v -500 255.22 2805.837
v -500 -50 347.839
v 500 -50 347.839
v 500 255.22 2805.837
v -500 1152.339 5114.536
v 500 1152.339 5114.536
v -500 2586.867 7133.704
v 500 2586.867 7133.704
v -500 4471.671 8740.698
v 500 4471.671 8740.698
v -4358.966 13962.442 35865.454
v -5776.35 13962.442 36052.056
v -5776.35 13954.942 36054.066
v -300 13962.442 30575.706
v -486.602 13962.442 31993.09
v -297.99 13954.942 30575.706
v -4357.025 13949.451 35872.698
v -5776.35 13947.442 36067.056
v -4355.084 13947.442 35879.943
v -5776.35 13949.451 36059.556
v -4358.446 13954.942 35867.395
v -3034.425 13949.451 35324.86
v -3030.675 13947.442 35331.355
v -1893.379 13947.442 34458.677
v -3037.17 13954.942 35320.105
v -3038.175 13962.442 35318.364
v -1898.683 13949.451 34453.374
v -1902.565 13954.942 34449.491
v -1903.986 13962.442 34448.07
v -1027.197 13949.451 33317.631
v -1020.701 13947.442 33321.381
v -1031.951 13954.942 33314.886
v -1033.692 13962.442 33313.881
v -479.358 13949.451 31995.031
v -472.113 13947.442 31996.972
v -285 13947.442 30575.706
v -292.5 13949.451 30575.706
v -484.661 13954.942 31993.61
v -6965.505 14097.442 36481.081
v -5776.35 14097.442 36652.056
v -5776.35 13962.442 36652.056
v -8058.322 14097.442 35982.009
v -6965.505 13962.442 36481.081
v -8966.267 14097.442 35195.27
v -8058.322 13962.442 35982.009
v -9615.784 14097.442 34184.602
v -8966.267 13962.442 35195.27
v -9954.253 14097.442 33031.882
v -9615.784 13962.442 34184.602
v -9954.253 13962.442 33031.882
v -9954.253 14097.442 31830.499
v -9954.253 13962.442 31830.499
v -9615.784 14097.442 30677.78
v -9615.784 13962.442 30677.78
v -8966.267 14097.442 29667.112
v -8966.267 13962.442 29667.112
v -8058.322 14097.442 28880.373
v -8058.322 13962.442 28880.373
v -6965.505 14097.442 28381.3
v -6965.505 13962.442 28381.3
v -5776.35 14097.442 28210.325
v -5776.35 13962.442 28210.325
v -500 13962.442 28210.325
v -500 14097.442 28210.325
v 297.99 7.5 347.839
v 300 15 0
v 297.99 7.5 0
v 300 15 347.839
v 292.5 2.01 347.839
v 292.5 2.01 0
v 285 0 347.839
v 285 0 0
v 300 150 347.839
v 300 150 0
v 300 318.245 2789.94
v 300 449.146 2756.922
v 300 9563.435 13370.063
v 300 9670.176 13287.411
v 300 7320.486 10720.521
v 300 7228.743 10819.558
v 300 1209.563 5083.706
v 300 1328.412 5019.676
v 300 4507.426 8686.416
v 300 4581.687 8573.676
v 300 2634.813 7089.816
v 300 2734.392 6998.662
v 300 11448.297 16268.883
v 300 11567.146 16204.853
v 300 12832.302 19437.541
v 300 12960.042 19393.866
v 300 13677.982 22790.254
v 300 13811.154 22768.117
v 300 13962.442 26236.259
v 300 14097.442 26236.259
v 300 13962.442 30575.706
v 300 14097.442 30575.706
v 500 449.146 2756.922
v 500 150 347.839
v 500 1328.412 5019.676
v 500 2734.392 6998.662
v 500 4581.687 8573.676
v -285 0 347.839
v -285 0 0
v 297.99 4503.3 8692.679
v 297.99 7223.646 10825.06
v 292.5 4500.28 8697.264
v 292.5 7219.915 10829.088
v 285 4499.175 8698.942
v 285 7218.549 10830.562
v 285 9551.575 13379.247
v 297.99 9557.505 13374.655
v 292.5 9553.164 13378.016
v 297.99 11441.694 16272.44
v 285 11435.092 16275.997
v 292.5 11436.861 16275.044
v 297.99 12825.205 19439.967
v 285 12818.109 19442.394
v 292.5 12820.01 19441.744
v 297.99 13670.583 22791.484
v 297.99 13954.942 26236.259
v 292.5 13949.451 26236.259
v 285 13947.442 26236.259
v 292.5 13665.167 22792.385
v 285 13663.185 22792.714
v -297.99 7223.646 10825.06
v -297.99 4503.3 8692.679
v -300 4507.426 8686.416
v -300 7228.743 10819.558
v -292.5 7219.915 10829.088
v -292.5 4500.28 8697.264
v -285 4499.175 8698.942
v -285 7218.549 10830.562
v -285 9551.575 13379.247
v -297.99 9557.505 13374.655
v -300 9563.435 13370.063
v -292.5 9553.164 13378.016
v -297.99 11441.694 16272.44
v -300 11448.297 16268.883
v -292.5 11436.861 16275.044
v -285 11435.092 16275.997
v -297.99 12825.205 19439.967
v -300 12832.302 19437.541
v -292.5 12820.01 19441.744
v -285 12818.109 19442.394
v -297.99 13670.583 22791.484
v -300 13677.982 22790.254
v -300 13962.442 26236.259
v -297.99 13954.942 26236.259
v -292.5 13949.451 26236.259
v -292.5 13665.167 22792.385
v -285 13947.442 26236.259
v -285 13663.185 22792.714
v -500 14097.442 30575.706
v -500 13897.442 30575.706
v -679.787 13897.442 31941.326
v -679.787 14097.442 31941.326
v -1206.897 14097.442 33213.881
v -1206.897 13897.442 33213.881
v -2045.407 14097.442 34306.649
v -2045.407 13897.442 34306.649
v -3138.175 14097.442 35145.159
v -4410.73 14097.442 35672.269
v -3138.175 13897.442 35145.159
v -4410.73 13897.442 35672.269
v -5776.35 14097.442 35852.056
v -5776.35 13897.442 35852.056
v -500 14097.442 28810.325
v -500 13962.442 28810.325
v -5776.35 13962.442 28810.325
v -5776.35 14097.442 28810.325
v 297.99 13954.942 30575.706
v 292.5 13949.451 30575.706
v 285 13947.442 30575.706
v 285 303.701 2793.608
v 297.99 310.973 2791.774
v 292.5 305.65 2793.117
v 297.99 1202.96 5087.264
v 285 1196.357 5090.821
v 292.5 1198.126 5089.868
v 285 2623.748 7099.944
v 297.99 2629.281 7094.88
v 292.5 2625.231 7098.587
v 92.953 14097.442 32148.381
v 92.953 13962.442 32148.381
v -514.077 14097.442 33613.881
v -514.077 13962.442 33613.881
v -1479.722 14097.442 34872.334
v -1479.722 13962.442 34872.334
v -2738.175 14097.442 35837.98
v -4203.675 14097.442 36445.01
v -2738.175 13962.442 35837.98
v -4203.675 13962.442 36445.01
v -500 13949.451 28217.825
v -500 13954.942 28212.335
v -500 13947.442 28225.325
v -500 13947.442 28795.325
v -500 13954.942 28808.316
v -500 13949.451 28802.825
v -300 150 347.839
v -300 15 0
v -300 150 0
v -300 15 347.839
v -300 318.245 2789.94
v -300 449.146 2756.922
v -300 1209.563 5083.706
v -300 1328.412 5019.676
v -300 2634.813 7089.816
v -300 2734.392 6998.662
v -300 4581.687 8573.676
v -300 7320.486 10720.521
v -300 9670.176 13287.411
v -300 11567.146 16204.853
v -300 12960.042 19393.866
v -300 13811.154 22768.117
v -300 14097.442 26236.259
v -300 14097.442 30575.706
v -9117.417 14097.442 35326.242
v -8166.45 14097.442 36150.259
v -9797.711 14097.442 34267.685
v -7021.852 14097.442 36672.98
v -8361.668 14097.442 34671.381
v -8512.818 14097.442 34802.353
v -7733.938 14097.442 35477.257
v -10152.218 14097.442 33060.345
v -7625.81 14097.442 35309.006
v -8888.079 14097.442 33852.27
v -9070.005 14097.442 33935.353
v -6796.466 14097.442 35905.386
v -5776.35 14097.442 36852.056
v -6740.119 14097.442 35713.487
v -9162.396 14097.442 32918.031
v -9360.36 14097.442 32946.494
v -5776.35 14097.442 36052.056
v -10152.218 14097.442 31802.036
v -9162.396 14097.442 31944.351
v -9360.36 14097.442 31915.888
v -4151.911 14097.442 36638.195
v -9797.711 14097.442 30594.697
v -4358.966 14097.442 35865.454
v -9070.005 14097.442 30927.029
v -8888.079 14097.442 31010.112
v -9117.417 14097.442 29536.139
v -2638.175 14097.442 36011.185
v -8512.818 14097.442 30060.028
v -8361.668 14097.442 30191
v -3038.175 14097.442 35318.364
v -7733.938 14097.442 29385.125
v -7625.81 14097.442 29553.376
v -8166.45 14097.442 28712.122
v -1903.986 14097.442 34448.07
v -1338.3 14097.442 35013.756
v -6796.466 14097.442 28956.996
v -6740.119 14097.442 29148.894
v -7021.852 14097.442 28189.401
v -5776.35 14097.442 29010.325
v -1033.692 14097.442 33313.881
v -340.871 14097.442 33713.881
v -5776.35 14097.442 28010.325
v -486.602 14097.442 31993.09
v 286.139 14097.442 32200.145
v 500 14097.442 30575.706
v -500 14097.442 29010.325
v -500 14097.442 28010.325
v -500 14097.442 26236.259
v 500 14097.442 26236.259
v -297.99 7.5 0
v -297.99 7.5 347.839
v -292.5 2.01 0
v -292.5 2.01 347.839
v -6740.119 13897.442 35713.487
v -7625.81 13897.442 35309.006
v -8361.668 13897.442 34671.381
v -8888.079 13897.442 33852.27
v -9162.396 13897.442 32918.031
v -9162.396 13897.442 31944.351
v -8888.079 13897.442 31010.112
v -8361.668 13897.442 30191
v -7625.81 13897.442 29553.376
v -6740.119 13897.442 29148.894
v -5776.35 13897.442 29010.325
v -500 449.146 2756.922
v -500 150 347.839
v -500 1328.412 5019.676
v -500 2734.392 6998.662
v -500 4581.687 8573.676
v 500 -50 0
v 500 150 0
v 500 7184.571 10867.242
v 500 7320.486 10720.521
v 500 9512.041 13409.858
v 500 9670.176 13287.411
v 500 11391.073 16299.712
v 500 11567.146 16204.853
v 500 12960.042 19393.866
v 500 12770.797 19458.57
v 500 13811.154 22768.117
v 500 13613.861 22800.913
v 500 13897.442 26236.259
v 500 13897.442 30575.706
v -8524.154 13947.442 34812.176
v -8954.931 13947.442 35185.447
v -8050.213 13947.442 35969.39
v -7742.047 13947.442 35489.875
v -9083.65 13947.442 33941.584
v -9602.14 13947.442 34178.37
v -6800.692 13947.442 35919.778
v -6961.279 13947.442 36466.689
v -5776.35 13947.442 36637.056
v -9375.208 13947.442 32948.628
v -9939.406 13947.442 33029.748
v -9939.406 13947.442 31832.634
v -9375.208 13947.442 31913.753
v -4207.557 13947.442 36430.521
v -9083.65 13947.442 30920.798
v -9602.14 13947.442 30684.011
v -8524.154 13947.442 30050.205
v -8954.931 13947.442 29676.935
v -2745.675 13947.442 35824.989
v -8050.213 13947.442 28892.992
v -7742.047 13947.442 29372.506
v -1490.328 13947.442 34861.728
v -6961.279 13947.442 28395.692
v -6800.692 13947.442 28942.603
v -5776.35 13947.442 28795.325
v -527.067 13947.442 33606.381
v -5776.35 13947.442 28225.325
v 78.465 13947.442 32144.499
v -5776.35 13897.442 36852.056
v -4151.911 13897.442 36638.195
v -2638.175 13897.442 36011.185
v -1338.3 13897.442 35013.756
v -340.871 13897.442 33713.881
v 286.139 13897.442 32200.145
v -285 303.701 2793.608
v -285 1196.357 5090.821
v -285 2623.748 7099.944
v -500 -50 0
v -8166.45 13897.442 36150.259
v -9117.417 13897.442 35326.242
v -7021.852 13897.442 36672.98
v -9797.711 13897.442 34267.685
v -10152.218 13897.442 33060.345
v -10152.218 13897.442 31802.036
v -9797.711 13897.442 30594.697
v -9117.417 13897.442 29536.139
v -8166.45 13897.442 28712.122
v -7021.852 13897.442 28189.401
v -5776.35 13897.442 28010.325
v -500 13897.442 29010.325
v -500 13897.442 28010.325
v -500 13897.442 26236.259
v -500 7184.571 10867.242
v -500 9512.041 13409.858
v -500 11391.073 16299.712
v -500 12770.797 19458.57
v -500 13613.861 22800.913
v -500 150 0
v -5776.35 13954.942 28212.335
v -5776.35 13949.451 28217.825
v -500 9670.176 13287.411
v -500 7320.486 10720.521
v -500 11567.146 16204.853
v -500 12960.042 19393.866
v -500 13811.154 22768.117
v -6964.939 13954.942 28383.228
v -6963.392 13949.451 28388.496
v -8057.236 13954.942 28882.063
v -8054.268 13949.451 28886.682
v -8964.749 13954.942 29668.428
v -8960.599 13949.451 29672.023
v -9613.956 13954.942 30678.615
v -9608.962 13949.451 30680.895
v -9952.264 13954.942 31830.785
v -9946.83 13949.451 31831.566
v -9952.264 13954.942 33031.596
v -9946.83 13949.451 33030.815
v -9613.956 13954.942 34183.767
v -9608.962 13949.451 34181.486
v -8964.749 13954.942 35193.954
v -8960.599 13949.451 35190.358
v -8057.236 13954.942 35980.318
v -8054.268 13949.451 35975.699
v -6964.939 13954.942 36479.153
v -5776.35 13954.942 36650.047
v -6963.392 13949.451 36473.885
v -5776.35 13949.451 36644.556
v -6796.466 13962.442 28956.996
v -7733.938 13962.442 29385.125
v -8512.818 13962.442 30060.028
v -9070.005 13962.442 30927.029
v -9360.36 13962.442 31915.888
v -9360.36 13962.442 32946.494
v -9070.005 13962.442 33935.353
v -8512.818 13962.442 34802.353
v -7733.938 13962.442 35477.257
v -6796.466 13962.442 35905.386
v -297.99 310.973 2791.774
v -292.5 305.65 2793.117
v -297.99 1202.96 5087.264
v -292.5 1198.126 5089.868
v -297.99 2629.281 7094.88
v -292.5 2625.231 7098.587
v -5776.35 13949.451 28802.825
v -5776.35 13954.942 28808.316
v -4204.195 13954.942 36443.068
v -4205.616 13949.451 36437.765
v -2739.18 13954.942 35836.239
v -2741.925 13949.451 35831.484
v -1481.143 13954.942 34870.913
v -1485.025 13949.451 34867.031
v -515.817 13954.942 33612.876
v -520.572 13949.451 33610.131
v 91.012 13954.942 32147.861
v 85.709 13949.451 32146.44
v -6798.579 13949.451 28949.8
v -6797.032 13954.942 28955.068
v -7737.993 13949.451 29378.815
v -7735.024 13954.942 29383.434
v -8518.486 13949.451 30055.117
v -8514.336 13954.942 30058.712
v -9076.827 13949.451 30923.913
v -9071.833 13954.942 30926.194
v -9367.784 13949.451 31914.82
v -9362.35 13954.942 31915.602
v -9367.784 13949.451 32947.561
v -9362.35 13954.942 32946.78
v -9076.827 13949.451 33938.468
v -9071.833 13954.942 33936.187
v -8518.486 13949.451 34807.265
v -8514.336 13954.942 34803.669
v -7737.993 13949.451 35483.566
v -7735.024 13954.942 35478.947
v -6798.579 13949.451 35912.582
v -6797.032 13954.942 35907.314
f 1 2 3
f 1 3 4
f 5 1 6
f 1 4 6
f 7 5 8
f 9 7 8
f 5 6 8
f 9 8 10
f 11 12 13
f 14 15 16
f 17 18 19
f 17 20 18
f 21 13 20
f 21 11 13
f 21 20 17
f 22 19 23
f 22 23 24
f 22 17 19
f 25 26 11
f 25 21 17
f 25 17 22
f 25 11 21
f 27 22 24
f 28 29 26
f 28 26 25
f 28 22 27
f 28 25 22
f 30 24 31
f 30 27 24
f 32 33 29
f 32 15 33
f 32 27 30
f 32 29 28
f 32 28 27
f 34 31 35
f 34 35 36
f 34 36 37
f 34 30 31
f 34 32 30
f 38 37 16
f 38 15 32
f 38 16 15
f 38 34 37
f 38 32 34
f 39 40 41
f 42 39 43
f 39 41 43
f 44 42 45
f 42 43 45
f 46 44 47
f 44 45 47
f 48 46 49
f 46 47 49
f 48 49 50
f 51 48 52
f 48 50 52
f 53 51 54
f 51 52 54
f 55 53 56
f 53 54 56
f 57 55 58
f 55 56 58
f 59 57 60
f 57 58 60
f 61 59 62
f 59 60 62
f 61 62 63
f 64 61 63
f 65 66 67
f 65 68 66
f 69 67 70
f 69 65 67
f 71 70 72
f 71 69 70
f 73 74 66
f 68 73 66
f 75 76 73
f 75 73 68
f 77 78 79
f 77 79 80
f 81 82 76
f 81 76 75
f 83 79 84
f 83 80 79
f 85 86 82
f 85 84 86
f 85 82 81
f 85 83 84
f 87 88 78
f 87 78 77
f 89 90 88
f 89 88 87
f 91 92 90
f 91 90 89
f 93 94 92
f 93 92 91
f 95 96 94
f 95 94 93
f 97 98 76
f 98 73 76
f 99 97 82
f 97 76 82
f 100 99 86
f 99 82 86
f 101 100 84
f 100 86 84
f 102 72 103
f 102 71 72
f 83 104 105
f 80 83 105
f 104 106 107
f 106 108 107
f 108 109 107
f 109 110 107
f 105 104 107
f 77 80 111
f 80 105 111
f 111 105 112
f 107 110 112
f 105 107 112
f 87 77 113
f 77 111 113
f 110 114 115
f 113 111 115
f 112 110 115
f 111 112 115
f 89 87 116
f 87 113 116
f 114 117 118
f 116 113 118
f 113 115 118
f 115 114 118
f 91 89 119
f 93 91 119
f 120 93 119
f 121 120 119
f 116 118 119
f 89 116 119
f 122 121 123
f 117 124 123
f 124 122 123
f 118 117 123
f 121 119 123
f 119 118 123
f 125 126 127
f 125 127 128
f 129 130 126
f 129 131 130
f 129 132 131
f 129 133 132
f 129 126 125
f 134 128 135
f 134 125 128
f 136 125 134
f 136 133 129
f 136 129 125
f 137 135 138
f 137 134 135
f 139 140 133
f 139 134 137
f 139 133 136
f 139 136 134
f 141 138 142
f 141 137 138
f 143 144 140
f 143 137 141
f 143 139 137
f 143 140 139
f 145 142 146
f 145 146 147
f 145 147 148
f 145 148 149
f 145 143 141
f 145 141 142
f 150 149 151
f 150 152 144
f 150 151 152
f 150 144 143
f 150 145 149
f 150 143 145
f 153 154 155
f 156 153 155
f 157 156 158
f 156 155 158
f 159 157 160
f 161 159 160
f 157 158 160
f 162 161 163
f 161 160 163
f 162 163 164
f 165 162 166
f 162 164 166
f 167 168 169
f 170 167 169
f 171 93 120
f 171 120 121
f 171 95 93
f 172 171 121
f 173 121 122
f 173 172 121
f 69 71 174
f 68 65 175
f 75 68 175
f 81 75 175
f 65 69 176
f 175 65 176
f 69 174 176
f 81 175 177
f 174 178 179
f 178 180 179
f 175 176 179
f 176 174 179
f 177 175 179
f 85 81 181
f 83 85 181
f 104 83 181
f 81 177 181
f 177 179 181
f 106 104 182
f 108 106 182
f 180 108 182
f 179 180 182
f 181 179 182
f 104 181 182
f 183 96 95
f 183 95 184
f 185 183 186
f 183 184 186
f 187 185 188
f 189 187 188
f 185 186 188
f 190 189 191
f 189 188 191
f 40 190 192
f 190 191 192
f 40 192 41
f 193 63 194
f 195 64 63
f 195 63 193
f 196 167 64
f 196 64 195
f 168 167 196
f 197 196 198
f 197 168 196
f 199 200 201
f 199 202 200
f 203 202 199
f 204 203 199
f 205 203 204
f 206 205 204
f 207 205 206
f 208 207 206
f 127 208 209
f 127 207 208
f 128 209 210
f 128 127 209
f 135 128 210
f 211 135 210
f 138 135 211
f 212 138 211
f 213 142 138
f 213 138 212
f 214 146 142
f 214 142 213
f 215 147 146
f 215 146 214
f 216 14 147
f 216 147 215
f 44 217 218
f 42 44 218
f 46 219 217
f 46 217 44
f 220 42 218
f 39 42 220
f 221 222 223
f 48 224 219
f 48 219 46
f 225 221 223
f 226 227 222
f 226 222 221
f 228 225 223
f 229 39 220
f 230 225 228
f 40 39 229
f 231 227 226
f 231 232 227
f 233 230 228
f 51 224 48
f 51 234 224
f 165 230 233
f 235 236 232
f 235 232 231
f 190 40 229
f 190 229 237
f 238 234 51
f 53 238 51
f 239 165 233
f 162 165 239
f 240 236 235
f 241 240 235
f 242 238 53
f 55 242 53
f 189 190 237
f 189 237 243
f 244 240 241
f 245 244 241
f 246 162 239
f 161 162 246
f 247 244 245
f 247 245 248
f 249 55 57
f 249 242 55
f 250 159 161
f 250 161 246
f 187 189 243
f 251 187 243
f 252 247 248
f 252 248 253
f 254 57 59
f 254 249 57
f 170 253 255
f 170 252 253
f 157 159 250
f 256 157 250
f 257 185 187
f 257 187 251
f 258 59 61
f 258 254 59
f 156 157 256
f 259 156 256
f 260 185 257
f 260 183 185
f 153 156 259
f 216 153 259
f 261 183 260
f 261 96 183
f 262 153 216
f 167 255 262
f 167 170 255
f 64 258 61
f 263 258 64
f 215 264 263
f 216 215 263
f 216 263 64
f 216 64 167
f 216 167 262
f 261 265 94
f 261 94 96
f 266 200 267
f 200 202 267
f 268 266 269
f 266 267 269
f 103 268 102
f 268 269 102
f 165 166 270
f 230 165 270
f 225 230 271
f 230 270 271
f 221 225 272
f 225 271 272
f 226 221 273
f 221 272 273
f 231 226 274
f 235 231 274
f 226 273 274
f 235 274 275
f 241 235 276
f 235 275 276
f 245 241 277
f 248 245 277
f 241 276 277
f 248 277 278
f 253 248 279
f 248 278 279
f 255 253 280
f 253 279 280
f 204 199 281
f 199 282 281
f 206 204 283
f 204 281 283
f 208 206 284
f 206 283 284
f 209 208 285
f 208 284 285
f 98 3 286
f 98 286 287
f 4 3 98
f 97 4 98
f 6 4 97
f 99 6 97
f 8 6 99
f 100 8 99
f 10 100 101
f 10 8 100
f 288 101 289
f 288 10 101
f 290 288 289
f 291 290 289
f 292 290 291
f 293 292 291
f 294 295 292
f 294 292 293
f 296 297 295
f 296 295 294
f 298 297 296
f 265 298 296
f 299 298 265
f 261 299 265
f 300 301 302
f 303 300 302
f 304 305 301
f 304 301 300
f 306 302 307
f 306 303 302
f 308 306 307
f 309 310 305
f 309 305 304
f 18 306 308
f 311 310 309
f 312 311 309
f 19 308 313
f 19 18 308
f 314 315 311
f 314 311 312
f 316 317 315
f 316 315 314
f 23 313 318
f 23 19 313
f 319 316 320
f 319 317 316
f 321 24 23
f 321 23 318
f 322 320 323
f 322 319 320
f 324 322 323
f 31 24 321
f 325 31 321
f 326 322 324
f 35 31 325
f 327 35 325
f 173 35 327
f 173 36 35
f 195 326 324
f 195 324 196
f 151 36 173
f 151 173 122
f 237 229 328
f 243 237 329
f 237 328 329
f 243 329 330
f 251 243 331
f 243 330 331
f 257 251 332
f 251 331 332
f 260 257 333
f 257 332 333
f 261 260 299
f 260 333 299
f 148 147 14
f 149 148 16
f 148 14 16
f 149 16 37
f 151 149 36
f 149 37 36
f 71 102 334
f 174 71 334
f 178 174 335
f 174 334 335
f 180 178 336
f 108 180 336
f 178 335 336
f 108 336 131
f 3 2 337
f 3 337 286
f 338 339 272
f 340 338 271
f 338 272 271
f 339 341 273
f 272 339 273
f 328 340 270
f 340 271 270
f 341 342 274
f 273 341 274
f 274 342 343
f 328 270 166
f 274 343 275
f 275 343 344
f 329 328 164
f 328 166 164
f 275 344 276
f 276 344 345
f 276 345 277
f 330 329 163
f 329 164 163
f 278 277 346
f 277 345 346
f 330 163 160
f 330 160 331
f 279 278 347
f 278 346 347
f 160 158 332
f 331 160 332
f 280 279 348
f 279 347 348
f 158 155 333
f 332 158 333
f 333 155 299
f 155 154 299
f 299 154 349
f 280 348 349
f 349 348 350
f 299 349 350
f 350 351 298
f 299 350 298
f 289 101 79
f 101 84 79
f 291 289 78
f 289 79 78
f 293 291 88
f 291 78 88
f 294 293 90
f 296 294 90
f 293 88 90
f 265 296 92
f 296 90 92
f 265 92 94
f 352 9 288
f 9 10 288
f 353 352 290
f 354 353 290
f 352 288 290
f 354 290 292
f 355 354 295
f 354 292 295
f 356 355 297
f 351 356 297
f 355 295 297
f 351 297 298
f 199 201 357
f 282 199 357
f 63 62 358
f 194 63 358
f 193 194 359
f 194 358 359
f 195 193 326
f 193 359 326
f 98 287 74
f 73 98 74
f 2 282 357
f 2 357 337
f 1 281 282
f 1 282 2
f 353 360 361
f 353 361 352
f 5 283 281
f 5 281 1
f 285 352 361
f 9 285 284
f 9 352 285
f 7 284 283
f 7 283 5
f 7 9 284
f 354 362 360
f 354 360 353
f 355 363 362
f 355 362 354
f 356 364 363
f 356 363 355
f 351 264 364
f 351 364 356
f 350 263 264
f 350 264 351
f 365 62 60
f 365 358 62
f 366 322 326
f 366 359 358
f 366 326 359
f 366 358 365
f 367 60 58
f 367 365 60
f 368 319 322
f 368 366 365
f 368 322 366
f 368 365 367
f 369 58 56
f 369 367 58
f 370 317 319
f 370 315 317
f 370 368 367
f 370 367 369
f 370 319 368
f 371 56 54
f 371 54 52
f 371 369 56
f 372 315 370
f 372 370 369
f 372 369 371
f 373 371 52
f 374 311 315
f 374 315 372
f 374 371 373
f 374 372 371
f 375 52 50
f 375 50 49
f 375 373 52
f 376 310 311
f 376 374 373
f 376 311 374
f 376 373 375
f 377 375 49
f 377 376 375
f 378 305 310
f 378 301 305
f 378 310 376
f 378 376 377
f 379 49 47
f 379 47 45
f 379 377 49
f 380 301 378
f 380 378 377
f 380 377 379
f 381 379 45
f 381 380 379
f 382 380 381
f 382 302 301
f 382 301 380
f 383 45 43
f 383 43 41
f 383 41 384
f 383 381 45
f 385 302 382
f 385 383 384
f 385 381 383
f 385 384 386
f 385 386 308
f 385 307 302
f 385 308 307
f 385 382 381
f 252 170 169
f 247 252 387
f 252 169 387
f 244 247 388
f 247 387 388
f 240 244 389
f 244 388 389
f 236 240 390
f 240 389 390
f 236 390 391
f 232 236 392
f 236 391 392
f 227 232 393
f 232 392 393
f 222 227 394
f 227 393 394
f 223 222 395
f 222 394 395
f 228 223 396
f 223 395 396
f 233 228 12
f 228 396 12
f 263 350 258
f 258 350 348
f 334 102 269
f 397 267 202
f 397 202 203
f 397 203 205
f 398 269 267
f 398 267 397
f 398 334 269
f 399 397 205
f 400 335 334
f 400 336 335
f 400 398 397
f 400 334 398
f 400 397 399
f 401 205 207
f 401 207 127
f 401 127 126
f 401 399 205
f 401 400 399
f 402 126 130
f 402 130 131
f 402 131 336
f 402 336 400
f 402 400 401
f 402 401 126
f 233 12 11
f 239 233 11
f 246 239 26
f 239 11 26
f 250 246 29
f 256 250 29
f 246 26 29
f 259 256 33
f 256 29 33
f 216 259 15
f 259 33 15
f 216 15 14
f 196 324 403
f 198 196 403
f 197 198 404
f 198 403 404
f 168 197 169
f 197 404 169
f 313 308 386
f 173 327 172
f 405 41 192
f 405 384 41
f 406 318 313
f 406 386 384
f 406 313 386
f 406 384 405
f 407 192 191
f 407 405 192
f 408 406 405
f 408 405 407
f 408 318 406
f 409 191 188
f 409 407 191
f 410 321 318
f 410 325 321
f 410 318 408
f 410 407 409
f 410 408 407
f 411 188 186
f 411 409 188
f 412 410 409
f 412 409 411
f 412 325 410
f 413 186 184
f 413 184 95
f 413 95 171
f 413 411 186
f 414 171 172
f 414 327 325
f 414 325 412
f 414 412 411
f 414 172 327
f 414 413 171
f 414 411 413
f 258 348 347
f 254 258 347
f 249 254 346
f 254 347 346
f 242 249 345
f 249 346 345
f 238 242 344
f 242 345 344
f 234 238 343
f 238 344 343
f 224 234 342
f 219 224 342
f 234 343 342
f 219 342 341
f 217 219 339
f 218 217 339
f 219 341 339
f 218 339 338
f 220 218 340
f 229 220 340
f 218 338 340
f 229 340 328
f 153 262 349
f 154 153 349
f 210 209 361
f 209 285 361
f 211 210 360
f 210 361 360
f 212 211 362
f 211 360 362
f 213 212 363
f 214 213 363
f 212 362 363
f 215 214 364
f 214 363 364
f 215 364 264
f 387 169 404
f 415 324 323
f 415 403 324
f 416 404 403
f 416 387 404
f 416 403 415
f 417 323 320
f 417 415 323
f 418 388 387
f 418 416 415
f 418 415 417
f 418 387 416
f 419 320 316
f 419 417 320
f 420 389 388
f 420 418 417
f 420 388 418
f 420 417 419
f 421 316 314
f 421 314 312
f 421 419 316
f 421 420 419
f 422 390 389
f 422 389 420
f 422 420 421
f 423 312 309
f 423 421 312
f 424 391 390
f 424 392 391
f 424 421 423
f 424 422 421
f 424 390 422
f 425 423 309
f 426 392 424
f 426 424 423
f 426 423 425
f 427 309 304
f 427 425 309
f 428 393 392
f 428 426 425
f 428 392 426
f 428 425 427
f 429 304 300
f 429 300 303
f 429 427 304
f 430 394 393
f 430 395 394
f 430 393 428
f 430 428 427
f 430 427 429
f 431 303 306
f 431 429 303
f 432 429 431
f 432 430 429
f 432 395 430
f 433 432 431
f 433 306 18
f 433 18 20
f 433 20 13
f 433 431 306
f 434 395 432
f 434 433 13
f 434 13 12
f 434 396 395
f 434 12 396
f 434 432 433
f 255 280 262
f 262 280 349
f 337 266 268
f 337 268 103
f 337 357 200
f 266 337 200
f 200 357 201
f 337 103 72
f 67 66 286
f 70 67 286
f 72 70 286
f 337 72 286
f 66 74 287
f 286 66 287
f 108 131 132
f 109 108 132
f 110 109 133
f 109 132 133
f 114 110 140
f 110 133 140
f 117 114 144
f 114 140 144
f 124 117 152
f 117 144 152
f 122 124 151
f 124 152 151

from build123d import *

# Parameters (mm, degrees)
FILLET3_R      = 15
FILLET4_R      = 15
SWEEP3_START   = 13897.441767453
SWEEP3_DEPTH   = 200
SWEEP3_2_DEPTH = 50
SWEEP3_START_2 = -5776.350160621
SWEEP3_3_DEPTH = 5476.350160621
SWEEP3_4_ANGLE = 180
SWEEP3_5_ANGLE = 90


with BuildPart() as part:
    # Sweep1: sweep along a path in Sketch3
    with BuildLine(Plane(origin=(0, 0, 0), x_dir=(0, 0, -1), z_dir=(1, 0, 0))) as sweep1_path:
        Line((0, 0), (-347.839296309, 0))
        ThreePointArc((-347.839296309, 0), (-5090.820828897, 1196.357220927), (-8698.942320439, 4499.174763695))
        ThreePointArc((-8698.942320439, 4499.174763695), (-16275.997452676, 11435.091603507), (-26236.258671111, 13947.441767453))
        Line((-26236.258671111, 13947.441767453), (-30575.705984425, 13947.441767453))
    # Sketch1 → Sweep1 (sweep)
    with BuildSketch(Plane.XY):
        Polygon((-300, 0), (300, 0), (300, 150), (450, 150), (500, 150), (500, -50), (-500, -50), (-500, 150), (-450, 150), (-300, 150), align=None)
    sweep(path=sweep1_path.line)

    # Fillet3
    fillet3_edges = [part.edges().sort_by_distance(p)[0] for p in [
        (300, 1196.357220927, 5090.820828897),
        (300, 11435.091603507, 16275.997452676),
        (300, 13947.441767453, 28405.982327768),
        (300, 0, 173.919648155),
    ]]
    fillet(fillet3_edges, radius=FILLET3_R)

    # Fillet4
    fillet4_edges = [part.edges().sort_by_distance(p)[0] for p in [
        (-300, 11435.091603507, 16275.997452676),
        (-300, 13947.441767453, 28405.982327768),
        (-300, 0, 173.919648155),
        (-300, 1196.357220927, 5090.820828897),
    ]]
    fillet(fillet4_edges, radius=FILLET4_R)

    # Sweep3: read off the stored shape, not the designer's step
    # Sweep3 outline → Sweep3 (add)
    with BuildSketch(Plane(origin=(0, 0, 0), x_dir=(1, 0, 0), z_dir=(0, 1, 0)).offset(SWEEP3_START)):
        with BuildLine():
            Line((-5776.350160621, -28210.325241689), (-500, -28210.325241689))
            Line((-500, -28210.325241689), (-500, -28010.325241689))
            Line((-500, -28010.325241689), (-5776.350160621, -28010.325241689))
            ThreePointArc((-5776.350160621, -28010.325241689), (-10197.2156123, -32431.190693367), (-5776.350160621, -36852.056145046))
            ThreePointArc((-5776.350160621, -36852.056145046), (-1338.300400944, -35013.755744102), (500, -30575.705984425))
            Line((500, -30575.705984425), (300, -30575.705984425))
            ThreePointArc((300, -30575.705984425), (-1479.721757182, -34872.334387864), (-5776.350160621, -36652.056145046))
            ThreePointArc((-5776.350160621, -36652.056145046), (-9997.2156123, -32431.190693367), (-5776.350160621, -28210.325241689))
        make_face()
        with BuildLine():
            Line((-500, -29010.325241689), (-500, -28810.325241689))
            Line((-500, -28810.325241689), (-5776.350160621, -28810.325241689))
            ThreePointArc((-5776.350160621, -28810.325241689), (-9397.2156123, -32431.190693367), (-5776.350160621, -36052.056145046))
            ThreePointArc((-5776.350160621, -36052.056145046), (-1903.985825894, -34448.070319152), (-300, -30575.705984425))
            Line((-300, -30575.705984425), (-500, -30575.705984425))
            ThreePointArc((-500, -30575.705984425), (-2045.407182131, -34306.648962915), (-5776.350160621, -35852.056145046))
            ThreePointArc((-5776.350160621, -35852.056145046), (-9197.2156123, -32431.190693367), (-5776.350160621, -29010.325241689))
            Line((-5776.350160621, -29010.325241689), (-500, -29010.325241689))
        make_face()
    extrude(amount=SWEEP3_DEPTH)

    # Sweep3 2 outline → Sweep3 2 (add)
    with BuildSketch(Plane(origin=(0, 0, 0), x_dir=(1, 0, 0), z_dir=(0, 1, 0)).offset(SWEEP3_START)):
        with BuildLine():
            Line((-500, -28810.325241689), (-500, -28210.325241689))
            Line((-500, -28210.325241689), (-5776.350160621, -28210.325241689))
            ThreePointArc((-5776.350160621, -28210.325241689), (-9997.2156123, -32431.190693367), (-5776.350160621, -36652.056145046))
            ThreePointArc((-5776.350160621, -36652.056145046), (-1479.721757182, -34872.334387864), (300, -30575.705984425))
            Line((300, -30575.705984425), (-300, -30575.705984425))
            ThreePointArc((-300, -30575.705984425), (-1903.985825894, -34448.070319152), (-5776.350160621, -36052.056145046))
            ThreePointArc((-5776.350160621, -36052.056145046), (-9397.2156123, -32431.190693367), (-5776.350160621, -28810.325241689))
            Line((-5776.350160621, -28810.325241689), (-500, -28810.325241689))
        make_face()
    extrude(amount=SWEEP3_2_DEPTH)

    # Sweep3 3 outline → Sweep3 3 (add)
    with BuildSketch(Plane.YZ.offset(SWEEP3_START_2)):
        with BuildLine():
            Line((13947.441767453, 28210.325241689), (13962.441767453, 28210.325241689))
            ThreePointArc((13962.441767453, 28210.325241689), (13951.835165735, 28214.718639971), (13947.441767453, 28225.325241689))
            Line((13947.441767453, 28225.325241689), (13947.441767453, 28210.325241689))
        make_face()
        with BuildLine():
            Line((13947.441767453, 28810.325241689), (13947.441767453, 28795.325241689))
            ThreePointArc((13947.441767453, 28795.325241689), (13951.835165735, 28805.931843407), (13962.441767453, 28810.325241689))
            Line((13962.441767453, 28810.325241689), (13947.441767453, 28810.325241689))
        make_face()
    extrude(amount=SWEEP3_3_DEPTH)

    # Sweep3 4 outline → Sweep3 4 (revolve)
    with BuildSketch(Plane(origin=(-5776.350160621, 0, 32431.190693368), x_dir=(0, 0, -1), z_dir=(1, 0, 0))):
        with BuildLine():
            ThreePointArc((4220.865451679, 13962.441767453), (4216.472053397, 13951.835165735), (4205.865451679, 13947.441767453))
            Line((4205.865451679, 13947.441767453), (4220.865451679, 13947.441767453))
            Line((4220.865451679, 13947.441767453), (4220.865451679, 13962.441767453))
        make_face()
        with BuildLine():
            Line((3620.865451679, 13947.441767453), (3635.865451679, 13947.441767453))
            ThreePointArc((3635.865451679, 13947.441767453), (3625.258849961, 13951.835165735), (3620.865451679, 13962.441767453))
            Line((3620.865451679, 13962.441767453), (3620.865451679, 13947.441767453))
        make_face()
    revolve(axis=Axis((-5776.350160621, 0, 32431.190693368), (0, 1, 0)), revolution_arc=SWEEP3_4_ANGLE)

    # Sweep3 5 outline → Sweep3 5 (revolve)
    with BuildSketch(Plane(origin=(-5776.350160621, 0, 30575.705984425), x_dir=(0, 0, 1), z_dir=(-1, 0, 0))):
        with BuildLine():
            ThreePointArc((6076.350160621, 13962.441767453), (6071.956762339, 13951.835165735), (6061.350160621, 13947.441767453))
            Line((6061.350160621, 13947.441767453), (6076.350160621, 13947.441767453))
            Line((6076.350160621, 13947.441767453), (6076.350160621, 13962.441767453))
        make_face()
        with BuildLine():
            Line((5476.350160621, 13947.441767453), (5491.350160622, 13947.441767453))
            ThreePointArc((5491.350160622, 13947.441767453), (5480.743558904, 13951.835165735), (5476.350160621, 13962.441767453))
            Line((5476.350160621, 13962.441767453), (5476.350160621, 13947.441767453))
        make_face()
    revolve(axis=Axis((-5776.350160621, 0, 30575.705984425), (0, 1, 0)), revolution_arc=SWEEP3_5_ANGLE)


solid = part.part
